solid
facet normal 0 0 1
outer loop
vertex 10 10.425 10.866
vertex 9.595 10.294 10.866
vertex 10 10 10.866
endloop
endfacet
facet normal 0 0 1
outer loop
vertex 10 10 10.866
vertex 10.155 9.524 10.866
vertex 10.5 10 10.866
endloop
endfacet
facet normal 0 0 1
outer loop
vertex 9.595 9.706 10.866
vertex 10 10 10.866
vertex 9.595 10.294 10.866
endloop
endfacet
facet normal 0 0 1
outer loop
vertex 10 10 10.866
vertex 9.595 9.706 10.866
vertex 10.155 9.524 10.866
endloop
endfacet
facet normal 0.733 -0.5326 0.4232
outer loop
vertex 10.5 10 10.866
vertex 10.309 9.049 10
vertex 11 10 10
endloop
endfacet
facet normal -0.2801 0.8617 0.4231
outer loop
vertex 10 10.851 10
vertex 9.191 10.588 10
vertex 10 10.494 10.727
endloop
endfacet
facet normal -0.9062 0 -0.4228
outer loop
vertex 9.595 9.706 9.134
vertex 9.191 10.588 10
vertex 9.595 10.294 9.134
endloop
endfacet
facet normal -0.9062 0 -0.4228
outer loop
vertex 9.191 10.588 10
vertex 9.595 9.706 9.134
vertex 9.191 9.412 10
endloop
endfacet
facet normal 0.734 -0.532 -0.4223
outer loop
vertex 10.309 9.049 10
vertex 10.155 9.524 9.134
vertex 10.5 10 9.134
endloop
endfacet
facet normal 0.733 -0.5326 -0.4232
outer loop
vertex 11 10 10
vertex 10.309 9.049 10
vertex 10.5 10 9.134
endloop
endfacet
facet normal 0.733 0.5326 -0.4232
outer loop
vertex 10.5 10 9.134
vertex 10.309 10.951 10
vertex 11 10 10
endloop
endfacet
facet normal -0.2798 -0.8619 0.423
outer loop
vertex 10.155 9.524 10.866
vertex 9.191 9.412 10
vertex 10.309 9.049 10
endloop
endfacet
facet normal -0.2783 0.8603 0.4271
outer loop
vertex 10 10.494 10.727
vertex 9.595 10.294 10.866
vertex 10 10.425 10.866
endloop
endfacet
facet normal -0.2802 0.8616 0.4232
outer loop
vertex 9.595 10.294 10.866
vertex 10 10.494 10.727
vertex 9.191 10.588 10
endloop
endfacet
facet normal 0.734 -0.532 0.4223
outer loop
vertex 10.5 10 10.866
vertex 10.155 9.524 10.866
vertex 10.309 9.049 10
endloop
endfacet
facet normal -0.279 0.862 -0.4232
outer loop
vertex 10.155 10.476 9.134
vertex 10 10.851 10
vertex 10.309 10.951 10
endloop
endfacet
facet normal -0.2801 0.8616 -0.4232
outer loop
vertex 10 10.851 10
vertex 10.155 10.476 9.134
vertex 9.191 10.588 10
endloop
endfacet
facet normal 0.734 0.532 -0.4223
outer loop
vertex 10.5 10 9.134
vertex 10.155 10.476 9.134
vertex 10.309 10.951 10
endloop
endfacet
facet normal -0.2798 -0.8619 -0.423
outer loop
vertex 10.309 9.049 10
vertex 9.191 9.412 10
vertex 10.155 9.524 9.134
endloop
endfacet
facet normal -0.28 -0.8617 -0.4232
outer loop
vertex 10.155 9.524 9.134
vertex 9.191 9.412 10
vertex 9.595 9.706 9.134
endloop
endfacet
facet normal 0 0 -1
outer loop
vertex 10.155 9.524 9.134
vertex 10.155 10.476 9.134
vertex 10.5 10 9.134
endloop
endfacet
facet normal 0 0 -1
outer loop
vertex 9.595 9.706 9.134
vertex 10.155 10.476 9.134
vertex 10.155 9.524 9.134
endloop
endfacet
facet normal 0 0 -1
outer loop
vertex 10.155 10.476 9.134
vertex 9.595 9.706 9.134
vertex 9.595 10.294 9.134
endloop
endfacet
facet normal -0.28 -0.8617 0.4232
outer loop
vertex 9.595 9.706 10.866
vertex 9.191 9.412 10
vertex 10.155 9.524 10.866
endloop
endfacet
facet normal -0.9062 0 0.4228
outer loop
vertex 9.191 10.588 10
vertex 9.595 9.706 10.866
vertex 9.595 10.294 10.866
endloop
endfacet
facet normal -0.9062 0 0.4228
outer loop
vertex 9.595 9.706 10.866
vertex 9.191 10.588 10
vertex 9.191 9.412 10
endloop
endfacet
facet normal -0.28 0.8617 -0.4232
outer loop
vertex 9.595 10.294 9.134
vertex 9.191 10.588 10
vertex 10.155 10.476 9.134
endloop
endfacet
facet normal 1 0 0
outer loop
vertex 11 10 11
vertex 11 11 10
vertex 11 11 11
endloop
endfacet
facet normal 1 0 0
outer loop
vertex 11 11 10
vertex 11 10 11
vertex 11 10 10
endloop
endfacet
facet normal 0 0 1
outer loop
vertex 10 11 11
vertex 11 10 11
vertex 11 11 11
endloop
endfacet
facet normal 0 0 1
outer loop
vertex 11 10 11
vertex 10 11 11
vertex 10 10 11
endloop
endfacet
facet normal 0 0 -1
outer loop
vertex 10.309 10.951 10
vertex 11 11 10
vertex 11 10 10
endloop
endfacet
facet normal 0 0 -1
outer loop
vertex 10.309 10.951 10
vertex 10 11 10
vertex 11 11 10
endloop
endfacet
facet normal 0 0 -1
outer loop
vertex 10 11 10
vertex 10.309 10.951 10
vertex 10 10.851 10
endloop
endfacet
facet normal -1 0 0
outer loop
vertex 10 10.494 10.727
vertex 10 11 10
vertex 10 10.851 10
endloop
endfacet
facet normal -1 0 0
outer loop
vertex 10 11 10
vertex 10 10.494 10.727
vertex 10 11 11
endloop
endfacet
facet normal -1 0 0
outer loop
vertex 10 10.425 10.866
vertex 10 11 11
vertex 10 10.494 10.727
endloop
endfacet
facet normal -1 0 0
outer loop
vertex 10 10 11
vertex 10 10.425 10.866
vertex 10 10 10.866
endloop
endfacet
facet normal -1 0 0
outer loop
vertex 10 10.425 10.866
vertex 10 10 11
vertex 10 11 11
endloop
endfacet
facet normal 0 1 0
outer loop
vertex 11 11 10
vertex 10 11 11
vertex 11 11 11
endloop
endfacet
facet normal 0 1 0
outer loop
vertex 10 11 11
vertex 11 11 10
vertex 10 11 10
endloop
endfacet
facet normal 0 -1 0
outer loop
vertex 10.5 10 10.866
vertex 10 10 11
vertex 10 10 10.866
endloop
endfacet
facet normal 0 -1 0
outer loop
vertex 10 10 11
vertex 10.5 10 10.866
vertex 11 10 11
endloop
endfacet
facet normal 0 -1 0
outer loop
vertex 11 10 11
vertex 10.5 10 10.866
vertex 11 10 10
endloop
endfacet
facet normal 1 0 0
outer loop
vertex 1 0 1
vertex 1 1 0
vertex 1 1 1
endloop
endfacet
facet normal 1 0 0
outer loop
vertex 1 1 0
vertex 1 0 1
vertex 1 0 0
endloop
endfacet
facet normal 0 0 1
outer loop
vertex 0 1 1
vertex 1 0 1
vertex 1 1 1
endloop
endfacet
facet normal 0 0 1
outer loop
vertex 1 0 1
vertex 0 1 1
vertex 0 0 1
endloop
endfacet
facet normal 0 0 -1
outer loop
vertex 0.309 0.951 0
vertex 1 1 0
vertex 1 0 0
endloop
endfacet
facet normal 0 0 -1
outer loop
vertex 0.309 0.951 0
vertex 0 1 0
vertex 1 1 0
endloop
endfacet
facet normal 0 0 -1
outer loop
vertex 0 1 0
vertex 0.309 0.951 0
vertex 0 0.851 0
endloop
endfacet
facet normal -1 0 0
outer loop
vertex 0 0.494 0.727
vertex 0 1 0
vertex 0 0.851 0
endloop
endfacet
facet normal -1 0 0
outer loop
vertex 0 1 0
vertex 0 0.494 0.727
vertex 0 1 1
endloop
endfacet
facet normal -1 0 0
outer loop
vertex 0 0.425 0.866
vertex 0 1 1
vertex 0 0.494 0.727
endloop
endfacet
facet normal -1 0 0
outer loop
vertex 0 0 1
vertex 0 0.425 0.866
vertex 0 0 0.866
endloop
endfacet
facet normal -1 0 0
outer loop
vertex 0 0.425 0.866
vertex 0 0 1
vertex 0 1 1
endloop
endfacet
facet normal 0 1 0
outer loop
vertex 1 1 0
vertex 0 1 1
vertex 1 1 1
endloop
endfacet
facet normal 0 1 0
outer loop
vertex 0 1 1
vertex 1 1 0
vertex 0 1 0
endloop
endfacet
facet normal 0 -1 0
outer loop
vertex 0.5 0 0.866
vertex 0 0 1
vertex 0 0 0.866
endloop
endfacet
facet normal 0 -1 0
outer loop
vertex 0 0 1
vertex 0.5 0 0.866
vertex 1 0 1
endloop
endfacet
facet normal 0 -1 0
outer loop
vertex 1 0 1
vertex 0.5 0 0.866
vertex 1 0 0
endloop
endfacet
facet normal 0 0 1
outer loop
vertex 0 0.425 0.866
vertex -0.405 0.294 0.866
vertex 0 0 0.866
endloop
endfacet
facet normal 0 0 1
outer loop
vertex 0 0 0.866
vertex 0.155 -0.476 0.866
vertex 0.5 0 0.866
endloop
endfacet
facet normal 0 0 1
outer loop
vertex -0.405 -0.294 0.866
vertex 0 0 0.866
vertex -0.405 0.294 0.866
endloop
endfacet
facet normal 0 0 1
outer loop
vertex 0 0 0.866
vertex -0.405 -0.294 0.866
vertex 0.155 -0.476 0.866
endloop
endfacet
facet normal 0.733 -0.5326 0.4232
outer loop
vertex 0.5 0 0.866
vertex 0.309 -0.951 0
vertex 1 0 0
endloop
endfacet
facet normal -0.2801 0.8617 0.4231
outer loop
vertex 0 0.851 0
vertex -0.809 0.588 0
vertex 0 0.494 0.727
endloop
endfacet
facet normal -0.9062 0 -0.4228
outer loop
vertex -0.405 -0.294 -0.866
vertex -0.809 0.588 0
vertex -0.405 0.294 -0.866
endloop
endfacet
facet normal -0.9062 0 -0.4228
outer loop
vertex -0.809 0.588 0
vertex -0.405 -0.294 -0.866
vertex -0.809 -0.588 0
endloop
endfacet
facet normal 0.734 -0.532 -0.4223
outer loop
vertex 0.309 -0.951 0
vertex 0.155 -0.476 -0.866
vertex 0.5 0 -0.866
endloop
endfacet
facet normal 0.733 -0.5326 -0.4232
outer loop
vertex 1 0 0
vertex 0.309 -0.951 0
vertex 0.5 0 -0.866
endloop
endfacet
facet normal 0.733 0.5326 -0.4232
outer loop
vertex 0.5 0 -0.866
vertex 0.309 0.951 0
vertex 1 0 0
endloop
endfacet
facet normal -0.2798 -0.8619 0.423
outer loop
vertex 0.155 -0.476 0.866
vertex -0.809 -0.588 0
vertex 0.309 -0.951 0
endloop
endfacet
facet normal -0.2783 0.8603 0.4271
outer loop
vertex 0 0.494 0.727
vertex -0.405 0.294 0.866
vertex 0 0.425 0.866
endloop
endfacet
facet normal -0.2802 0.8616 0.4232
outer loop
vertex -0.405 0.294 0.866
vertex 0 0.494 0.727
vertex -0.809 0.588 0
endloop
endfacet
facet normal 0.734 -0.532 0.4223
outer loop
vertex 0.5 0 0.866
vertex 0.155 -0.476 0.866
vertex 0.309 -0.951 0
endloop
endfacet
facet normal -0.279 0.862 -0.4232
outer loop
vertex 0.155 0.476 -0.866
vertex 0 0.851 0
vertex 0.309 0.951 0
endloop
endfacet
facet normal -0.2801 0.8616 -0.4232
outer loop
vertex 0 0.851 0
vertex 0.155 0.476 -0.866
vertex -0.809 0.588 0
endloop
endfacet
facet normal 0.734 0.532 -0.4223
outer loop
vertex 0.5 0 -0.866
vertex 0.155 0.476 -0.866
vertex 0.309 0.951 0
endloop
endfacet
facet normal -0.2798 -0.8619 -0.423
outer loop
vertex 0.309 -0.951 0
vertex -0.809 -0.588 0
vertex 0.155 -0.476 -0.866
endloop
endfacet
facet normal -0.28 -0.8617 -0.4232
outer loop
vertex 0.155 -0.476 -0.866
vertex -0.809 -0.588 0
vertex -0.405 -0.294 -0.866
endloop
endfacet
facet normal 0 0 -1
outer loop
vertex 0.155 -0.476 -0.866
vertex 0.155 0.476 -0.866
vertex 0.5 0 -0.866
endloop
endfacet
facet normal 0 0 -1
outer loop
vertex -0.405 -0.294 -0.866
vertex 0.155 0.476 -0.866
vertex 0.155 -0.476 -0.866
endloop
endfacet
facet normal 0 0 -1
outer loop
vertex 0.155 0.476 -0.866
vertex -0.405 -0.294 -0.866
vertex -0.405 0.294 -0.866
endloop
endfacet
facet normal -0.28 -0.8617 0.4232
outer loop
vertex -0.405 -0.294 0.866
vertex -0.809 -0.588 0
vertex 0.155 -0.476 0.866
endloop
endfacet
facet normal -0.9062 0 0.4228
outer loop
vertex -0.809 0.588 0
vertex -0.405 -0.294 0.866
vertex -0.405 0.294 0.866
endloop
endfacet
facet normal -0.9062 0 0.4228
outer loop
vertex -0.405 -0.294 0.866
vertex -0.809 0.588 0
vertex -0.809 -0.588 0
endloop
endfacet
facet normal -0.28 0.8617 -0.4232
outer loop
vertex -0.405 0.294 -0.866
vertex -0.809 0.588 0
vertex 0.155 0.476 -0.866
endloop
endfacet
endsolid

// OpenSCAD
// This tests many variations of if/else with single/multiple children
// to verify AST dump indentation behavior.
if (true) {
  cube();
  sphere();
  translate([10,10,10]) if (false) {
    cylinder();
    cube();
  } else {
    sphere();
    cube();
  }
} else {
  echo("hi");
}

if (true) cube();
else sphere();

if (true) {
  if (false) {
    if (true) {
      echo("hello");
      echo("world");
    } else {
      if (true) echo("hello"); else echo("bye bye");
      echo("world");
    }
    assert(true);
  } else {
    echo("hello world");
  }
  echo("!");
}
